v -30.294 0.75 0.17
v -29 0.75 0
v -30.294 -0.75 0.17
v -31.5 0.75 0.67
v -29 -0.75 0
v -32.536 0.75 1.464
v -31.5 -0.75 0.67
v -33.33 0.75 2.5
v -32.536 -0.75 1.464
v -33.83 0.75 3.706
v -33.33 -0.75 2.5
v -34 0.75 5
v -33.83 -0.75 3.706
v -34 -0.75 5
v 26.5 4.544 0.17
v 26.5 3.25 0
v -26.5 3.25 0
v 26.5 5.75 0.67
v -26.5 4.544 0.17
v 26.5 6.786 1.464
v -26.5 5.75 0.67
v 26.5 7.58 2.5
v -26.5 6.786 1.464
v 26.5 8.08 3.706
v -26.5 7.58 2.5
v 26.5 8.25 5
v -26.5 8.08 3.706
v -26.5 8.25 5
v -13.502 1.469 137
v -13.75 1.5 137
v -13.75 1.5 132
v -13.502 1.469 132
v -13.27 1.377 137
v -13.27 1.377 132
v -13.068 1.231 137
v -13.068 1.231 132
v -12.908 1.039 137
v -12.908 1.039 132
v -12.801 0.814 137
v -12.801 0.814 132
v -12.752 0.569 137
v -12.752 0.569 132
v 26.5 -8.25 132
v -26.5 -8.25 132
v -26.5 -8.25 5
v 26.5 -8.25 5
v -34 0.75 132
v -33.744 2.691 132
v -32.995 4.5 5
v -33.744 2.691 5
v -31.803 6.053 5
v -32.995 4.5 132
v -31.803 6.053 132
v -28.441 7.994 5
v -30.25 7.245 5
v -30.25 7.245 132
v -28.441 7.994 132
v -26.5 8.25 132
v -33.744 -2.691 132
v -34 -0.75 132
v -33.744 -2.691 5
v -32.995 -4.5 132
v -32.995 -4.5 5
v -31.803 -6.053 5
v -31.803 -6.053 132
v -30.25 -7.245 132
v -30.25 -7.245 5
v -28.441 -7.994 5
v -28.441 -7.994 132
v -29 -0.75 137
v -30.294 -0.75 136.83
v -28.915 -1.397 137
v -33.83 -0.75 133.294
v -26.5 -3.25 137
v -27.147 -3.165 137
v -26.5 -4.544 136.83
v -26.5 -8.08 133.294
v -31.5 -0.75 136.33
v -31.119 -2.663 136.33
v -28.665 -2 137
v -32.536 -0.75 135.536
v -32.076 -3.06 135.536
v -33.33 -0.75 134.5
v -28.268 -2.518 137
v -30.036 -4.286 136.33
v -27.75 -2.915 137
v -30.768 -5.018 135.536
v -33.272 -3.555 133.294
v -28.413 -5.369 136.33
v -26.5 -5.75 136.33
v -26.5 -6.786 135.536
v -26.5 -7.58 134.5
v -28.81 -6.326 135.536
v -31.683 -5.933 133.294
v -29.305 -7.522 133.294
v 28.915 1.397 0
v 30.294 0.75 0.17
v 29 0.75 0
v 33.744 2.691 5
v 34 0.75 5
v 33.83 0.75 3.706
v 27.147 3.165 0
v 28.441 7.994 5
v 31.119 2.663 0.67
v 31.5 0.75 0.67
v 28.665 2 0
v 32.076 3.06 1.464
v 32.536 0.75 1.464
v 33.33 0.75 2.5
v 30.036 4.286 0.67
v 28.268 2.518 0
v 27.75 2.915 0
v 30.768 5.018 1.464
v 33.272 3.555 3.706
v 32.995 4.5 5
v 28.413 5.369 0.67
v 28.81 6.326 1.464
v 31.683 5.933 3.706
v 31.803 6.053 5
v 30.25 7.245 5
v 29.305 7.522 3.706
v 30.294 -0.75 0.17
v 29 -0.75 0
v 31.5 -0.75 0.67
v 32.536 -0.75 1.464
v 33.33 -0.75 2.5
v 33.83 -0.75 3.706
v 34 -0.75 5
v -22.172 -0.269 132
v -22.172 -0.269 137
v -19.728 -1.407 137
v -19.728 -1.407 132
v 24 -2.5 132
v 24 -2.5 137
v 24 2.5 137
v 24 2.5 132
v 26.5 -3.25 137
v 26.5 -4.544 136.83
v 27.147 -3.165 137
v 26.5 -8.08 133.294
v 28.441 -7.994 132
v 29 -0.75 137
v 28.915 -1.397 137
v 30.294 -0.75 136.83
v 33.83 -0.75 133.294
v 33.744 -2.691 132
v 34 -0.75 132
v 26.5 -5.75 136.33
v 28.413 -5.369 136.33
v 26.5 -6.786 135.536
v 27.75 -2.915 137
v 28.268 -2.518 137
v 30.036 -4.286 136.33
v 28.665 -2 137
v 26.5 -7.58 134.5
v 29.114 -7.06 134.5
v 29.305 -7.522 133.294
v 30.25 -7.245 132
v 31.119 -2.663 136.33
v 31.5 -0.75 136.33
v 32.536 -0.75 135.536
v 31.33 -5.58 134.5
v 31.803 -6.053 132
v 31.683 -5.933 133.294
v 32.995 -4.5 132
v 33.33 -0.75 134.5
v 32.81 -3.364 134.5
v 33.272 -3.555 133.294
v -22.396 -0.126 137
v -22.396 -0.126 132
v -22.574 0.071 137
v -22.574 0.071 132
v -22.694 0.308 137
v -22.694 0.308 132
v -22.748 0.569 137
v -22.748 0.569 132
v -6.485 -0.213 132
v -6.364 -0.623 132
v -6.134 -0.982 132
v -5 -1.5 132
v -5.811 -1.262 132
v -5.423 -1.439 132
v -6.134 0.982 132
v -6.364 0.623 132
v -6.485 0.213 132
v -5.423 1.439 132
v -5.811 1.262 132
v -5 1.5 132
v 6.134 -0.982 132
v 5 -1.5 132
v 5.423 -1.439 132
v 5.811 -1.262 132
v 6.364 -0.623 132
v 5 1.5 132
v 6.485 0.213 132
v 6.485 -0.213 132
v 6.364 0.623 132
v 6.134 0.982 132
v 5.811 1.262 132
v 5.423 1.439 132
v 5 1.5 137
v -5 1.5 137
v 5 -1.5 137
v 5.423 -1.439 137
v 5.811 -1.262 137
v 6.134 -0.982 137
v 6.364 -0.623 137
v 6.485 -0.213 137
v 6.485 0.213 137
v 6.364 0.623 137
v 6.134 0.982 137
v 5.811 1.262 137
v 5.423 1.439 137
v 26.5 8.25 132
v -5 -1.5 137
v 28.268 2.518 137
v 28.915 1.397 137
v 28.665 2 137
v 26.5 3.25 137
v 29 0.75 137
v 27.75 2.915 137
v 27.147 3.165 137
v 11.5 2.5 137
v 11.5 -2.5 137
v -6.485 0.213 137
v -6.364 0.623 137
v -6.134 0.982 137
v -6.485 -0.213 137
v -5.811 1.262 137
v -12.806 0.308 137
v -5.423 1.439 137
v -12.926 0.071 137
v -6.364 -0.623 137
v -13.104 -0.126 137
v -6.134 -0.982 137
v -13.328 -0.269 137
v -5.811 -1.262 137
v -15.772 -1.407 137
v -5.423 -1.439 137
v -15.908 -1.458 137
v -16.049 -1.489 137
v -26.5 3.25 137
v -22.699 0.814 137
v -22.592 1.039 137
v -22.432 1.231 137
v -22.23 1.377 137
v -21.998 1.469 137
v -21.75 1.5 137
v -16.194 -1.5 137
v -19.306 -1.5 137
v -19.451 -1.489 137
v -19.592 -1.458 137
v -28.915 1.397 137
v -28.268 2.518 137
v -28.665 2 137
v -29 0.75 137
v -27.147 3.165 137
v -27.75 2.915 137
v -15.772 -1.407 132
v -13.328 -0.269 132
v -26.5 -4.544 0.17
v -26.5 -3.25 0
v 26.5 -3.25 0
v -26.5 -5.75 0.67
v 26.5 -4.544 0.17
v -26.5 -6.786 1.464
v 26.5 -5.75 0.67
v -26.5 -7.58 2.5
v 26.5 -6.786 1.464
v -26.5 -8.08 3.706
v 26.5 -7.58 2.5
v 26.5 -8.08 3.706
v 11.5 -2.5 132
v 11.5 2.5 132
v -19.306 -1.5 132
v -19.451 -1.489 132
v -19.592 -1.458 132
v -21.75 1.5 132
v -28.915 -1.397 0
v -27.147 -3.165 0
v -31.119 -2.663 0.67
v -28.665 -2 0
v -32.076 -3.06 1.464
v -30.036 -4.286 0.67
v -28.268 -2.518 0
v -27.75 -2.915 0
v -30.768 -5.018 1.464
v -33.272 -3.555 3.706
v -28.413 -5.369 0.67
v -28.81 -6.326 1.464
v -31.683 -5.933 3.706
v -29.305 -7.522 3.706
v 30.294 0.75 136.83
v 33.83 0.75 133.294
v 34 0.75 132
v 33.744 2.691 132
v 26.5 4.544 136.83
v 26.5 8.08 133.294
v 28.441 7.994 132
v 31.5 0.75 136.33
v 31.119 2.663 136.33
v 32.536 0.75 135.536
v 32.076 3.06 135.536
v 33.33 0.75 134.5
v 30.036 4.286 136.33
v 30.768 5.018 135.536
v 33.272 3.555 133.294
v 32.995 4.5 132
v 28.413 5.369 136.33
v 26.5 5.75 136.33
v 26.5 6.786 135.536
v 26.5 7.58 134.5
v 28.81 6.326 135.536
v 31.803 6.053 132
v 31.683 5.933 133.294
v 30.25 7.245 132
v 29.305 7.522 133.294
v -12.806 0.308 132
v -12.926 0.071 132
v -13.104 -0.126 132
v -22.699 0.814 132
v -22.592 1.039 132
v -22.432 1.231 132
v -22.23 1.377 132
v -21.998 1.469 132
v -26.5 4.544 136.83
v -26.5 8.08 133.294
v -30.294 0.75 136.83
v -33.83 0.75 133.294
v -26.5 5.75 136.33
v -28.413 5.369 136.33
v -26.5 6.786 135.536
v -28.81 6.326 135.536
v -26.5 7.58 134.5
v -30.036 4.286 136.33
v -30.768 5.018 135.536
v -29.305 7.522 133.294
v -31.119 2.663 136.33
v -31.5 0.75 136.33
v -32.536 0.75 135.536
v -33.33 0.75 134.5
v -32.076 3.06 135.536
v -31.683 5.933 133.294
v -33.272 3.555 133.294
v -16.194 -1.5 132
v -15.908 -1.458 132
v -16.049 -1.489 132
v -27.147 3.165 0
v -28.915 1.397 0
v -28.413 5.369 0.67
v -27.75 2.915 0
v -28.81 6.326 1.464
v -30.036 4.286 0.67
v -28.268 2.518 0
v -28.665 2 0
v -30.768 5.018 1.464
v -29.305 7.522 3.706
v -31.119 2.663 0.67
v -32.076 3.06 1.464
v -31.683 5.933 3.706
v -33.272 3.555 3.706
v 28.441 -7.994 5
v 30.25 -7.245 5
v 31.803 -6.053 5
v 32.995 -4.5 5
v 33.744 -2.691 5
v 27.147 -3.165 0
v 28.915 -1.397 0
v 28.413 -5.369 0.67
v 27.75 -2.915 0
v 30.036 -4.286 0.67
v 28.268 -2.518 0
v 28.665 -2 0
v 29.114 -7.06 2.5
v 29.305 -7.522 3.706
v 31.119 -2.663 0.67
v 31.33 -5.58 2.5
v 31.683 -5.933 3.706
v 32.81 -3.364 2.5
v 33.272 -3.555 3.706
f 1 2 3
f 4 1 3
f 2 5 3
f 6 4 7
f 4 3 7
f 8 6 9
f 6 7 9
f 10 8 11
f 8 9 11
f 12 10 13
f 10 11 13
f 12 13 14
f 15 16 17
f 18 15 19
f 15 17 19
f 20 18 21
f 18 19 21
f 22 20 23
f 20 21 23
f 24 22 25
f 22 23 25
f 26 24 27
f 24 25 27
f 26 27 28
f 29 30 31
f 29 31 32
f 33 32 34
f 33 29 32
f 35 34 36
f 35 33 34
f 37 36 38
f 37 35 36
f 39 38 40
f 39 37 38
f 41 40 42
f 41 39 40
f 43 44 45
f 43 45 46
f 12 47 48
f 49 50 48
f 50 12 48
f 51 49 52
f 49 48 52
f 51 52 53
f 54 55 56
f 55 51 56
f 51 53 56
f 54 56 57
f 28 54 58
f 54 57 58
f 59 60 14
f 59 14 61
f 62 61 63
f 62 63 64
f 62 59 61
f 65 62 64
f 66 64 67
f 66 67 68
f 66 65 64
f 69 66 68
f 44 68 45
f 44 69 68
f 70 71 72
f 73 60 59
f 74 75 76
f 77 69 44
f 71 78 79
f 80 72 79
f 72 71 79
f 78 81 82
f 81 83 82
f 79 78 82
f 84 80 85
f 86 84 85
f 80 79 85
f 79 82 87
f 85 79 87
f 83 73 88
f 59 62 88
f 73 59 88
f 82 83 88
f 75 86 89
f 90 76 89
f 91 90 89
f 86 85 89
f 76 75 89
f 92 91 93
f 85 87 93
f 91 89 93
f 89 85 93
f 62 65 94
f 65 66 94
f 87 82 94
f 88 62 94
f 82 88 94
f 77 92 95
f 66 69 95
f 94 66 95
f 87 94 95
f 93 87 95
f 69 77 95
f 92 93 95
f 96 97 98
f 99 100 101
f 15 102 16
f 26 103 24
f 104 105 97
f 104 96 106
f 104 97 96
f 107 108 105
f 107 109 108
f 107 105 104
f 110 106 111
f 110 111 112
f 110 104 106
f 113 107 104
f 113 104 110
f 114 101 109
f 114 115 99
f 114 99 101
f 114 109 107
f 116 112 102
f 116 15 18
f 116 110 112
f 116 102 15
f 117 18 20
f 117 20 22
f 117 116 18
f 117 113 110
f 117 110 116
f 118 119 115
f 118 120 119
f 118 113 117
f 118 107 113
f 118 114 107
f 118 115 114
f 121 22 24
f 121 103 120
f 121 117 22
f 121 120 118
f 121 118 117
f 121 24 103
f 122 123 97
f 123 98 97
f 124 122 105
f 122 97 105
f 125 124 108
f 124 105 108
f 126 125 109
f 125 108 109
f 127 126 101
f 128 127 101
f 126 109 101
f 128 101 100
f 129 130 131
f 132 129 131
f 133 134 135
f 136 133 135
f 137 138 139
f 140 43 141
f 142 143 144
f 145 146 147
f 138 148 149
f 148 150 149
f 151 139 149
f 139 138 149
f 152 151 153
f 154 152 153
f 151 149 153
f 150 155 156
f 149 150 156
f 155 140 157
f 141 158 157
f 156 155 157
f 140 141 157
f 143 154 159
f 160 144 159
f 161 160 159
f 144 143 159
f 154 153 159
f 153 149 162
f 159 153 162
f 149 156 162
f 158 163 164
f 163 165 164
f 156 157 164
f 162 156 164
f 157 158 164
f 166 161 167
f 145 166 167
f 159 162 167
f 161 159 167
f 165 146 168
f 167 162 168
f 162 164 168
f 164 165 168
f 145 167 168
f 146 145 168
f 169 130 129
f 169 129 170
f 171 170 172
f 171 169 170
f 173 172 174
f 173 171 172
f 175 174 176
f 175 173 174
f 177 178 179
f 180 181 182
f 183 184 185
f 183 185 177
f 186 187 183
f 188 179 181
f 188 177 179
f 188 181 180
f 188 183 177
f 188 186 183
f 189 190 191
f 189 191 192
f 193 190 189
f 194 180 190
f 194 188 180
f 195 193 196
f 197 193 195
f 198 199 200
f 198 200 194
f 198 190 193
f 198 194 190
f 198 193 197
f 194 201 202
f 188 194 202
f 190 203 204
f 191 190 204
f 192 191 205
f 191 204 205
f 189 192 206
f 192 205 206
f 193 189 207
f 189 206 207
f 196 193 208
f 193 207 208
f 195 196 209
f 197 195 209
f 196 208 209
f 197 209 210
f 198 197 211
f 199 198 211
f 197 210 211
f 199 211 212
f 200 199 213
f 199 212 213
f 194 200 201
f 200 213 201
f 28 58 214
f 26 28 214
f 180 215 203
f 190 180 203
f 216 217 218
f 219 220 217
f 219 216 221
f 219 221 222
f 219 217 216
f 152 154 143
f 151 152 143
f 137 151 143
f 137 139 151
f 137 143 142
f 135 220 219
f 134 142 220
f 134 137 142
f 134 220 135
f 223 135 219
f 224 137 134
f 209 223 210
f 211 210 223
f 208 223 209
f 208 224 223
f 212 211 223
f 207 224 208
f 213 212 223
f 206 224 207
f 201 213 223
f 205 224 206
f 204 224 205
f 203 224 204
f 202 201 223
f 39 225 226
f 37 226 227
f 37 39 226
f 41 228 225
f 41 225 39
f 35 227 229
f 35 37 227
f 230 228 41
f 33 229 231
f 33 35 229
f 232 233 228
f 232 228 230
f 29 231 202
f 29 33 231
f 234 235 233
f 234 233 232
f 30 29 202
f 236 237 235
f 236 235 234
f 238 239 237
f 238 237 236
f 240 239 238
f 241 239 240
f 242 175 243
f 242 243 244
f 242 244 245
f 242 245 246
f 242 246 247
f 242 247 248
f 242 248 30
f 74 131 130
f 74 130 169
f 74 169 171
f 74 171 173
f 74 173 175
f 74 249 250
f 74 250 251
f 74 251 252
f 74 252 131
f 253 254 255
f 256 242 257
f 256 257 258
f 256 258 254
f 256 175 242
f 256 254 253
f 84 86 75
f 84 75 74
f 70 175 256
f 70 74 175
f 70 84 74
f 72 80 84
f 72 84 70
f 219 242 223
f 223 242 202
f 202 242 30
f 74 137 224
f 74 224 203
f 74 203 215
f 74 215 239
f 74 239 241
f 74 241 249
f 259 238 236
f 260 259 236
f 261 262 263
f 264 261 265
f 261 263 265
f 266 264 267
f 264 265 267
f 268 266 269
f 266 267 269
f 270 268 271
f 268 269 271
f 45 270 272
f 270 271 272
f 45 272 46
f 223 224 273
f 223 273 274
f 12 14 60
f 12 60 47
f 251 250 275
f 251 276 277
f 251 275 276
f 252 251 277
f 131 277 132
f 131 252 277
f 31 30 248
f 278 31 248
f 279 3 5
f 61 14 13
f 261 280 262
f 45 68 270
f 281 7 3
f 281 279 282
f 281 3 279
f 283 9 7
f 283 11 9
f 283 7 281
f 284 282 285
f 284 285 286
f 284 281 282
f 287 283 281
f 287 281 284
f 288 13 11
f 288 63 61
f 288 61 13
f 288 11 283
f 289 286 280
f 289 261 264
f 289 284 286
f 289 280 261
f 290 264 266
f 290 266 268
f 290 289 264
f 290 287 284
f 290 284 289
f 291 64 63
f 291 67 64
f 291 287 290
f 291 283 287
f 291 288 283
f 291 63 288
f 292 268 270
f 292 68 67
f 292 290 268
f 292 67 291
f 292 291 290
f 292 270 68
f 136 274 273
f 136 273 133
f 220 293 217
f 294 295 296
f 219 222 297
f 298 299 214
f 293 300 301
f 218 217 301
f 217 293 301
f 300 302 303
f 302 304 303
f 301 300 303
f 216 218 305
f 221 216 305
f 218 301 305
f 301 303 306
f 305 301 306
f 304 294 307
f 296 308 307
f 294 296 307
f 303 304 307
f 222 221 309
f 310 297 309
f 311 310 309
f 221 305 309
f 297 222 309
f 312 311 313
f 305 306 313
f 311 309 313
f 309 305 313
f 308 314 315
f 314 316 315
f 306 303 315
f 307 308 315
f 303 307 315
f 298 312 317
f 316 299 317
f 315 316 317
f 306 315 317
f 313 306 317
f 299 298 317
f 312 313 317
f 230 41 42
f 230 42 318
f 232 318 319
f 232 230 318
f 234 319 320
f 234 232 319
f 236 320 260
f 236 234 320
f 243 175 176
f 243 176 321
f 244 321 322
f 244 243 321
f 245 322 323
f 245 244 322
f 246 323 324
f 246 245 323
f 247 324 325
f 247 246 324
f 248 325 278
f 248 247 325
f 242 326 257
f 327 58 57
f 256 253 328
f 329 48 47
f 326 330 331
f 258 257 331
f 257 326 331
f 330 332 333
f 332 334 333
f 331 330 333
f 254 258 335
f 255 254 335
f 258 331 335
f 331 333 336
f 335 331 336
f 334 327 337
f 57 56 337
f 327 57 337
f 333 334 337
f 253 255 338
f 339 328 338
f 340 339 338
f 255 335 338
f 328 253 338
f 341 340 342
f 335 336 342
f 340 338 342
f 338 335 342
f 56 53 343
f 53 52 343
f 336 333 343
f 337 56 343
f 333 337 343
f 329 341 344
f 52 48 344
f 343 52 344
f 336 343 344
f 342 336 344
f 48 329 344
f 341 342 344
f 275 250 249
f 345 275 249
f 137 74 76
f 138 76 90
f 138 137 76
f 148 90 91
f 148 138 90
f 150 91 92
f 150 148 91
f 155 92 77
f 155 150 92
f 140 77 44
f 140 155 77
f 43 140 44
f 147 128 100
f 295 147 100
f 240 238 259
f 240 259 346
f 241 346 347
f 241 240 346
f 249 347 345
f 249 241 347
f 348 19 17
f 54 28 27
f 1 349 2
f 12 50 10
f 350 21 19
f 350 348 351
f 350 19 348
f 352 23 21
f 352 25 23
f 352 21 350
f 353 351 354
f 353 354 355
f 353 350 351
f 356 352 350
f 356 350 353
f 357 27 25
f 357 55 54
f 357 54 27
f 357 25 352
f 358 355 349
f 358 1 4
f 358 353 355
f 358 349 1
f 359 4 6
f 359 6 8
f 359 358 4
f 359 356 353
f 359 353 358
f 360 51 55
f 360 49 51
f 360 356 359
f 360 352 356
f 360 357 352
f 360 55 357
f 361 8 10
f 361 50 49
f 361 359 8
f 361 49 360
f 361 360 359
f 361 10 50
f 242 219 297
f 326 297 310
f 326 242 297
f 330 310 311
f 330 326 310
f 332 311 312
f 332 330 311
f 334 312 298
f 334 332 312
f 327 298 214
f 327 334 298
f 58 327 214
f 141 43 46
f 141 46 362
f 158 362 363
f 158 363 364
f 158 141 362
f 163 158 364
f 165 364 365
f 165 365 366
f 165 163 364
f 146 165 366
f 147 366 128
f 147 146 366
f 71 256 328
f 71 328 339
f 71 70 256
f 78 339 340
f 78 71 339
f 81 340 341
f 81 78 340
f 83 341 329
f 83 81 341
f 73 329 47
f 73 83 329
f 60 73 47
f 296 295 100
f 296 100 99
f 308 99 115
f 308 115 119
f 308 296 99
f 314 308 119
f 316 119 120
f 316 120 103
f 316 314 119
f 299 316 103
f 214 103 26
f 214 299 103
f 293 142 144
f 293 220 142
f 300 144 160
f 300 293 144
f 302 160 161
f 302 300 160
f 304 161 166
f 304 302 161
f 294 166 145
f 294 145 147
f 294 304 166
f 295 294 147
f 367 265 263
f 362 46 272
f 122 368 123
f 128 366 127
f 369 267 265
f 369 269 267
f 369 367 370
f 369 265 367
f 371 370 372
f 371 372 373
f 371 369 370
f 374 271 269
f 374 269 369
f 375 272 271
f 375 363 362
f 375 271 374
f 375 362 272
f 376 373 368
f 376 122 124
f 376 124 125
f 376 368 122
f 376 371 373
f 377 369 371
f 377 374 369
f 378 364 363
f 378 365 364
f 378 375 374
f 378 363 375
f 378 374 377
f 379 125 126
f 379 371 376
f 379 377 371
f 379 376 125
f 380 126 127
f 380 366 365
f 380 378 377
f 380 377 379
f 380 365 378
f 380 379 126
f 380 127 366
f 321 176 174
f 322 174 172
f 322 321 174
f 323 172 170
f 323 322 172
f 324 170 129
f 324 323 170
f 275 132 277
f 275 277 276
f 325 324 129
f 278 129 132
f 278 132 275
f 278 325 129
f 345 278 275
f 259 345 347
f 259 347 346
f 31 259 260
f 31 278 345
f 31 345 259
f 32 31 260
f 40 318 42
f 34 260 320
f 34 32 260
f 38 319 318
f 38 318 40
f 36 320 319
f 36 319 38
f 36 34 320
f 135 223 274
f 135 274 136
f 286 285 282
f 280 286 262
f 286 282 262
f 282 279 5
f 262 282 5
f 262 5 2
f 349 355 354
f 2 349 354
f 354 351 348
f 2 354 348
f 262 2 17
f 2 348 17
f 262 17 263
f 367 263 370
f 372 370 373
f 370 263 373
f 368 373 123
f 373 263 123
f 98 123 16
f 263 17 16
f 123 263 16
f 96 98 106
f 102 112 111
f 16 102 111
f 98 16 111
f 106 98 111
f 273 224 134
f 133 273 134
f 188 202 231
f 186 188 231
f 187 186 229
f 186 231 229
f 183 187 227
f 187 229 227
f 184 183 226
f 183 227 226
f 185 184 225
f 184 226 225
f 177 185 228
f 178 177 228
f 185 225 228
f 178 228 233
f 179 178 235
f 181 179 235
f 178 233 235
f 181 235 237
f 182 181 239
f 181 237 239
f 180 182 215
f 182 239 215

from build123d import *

# Parameters (mm, degrees)
ESQUISSE1_W             = 68
ESQUISSE1_H             = 16.5
BOSS_EXTRU_1_DEPTH      = 137
CONG_1_R                = 7.5
CONG_2_R                = 5
ESQUISSE2_W             = 12.5
ESQUISSE2_H             = 5
ENL_V_MAT_EXTRU_1_DEPTH = 5
CONG_3_R                = 1


with BuildPart() as part:
    # Esquisse1 → Boss.-Extru.1 (new body)
    with BuildSketch(Plane.XY):
        Rectangle(ESQUISSE1_W, ESQUISSE1_H)
    extrude(amount=BOSS_EXTRU_1_DEPTH)

    # Congé1
    cong_1_edges = [part.edges().sort_by_distance(p)[0] for p in [
        (-34, 8.25, 68.5),
        (34, 8.25, 68.5),
        (34, -8.25, 68.5),
        (-34, -8.25, 68.5),
    ]]
    fillet(cong_1_edges, radius=CONG_1_R)

    # Congé2
    cong_2_edges = [part.edges().sort_by_distance(p)[0] for p in [
        (34, 0, 0),
        (34, 0, 137),
        (-34, 0, 0),
        (0, 8.25, 0),
        (0, -8.25, 0),
        (-31.803300859, 6.053300859, 0),
        (-31.803300859, -6.053300859, 0),
        (31.803300859, 6.053300859, 0),
        (31.803300859, -6.053300859, 0),
        (0, -8.25, 137),
        (-34, 0, 137),
        (0, 8.25, 137),
        (-31.803300859, 6.053300859, 137),
        (-31.803300859, -6.053300859, 137),
        (31.803300859, 6.053300859, 137),
        (31.803300859, -6.053300859, 137),
    ]]
    fillet(cong_2_edges, radius=CONG_2_R)

    # Esquisse2 → Enlèv. mat.-Extru.1 (cut)
    with BuildSketch(Plane.XY.offset(137)):
        Polygon((-12.75, 1.5), (-22.75, 1.5), (-22.75, 0), (-19.52732972, -1.5), (-15.97267028, -1.5), (-12.75, 0), align=None)
        with BuildLine():
            Line((5, 1.5), (-5, 1.5))
            ThreePointArc((-5, 1.5), (-6.5, 0), (-5, -1.5))
            Line((-5, -1.5), (5, -1.5))
            ThreePointArc((5, -1.5), (6.5, 0), (5, 1.5))
        make_face()
        with Locations((17.75, 0)):
            Rectangle(ESQUISSE2_W, ESQUISSE2_H)
    extrude(amount=-ENL_V_MAT_EXTRU_1_DEPTH, mode=Mode.SUBTRACT)

    # Congé3
    # the kernel refuses this fillet: 1 mm, written as the material it adds along each edge
    with BuildSketch(Plane(origin=(-15.97267028, -1.5, 137), x_dir=(0.9066045100812768, 0.4219813530243817, 0), z_dir=(0, 0, -1)), Plane(origin=(-19.52732972, -1.5, 137), x_dir=(1, 0, 0), z_dir=(0, 0, -1))) as cong_3_piece_1:
        with BuildLine():
            CenterArc((CONG_3_R * 0.221326106591, -CONG_3_R), CONG_3_R, 90, 24.959741925)
            Line((-CONG_3_R * 0.200655246434, -CONG_3_R * 0.0933954899187), (0, 0))
            Line((0, 0), (CONG_3_R * 0.221326106591, 0))
        make_face()
    extrude(amount=5.553315266)
    with BuildSketch(Plane(origin=(-22.75, 0, 137), x_dir=(0.9066045100812758, -0.42198135302438383, 0), z_dir=(0, 0, -1))) as cong_3_piece_2:
        with BuildLine():
            CenterArc((CONG_3_R * 0.637564274773, -CONG_3_R), CONG_3_R, 90, 65.040258075)
            Line((-CONG_3_R * 0.269040235309, -CONG_3_R * 0.578018646976), (0, 0))
            Line((0, 0), (CONG_3_R * 0.637564274773, 0))
        make_face()
    extrude(amount=6.593910687)
    with BuildSketch(Plane(origin=(-22.75, 1.5, 137), x_dir=(0, -1, 0), z_dir=(0, 0, -1)), Plane(origin=(-12.75, 1.5, 137), x_dir=(-1, 0, 0), z_dir=(0, 0, -1))) as cong_3_piece_3:
        with BuildLine():
            CenterArc((CONG_3_R, -CONG_3_R), CONG_3_R, 90, 90)
            Line((0, -CONG_3_R), (0, 0))
            Line((0, 0), (CONG_3_R, 0))
        make_face()
    extrude(amount=7.5)
    with BuildSketch(Plane(origin=(-12.75, 0, 137), x_dir=(-0.906604510081276, -0.4219813530243839, 0), z_dir=(0, 0, -1))) as cong_3_piece_4:
        with BuildLine():
            CenterArc((CONG_3_R * 0.637564274773, CONG_3_R), CONG_3_R, 204.959741925, 65.040258075)
            Line((-CONG_3_R * 0.269040235309, CONG_3_R * 0.578018646976), (0, 0))
            Line((0, 0), (CONG_3_R * 0.637564274773, 0))
        make_face()
    extrude(amount=6.593910687)


solid = part.part
